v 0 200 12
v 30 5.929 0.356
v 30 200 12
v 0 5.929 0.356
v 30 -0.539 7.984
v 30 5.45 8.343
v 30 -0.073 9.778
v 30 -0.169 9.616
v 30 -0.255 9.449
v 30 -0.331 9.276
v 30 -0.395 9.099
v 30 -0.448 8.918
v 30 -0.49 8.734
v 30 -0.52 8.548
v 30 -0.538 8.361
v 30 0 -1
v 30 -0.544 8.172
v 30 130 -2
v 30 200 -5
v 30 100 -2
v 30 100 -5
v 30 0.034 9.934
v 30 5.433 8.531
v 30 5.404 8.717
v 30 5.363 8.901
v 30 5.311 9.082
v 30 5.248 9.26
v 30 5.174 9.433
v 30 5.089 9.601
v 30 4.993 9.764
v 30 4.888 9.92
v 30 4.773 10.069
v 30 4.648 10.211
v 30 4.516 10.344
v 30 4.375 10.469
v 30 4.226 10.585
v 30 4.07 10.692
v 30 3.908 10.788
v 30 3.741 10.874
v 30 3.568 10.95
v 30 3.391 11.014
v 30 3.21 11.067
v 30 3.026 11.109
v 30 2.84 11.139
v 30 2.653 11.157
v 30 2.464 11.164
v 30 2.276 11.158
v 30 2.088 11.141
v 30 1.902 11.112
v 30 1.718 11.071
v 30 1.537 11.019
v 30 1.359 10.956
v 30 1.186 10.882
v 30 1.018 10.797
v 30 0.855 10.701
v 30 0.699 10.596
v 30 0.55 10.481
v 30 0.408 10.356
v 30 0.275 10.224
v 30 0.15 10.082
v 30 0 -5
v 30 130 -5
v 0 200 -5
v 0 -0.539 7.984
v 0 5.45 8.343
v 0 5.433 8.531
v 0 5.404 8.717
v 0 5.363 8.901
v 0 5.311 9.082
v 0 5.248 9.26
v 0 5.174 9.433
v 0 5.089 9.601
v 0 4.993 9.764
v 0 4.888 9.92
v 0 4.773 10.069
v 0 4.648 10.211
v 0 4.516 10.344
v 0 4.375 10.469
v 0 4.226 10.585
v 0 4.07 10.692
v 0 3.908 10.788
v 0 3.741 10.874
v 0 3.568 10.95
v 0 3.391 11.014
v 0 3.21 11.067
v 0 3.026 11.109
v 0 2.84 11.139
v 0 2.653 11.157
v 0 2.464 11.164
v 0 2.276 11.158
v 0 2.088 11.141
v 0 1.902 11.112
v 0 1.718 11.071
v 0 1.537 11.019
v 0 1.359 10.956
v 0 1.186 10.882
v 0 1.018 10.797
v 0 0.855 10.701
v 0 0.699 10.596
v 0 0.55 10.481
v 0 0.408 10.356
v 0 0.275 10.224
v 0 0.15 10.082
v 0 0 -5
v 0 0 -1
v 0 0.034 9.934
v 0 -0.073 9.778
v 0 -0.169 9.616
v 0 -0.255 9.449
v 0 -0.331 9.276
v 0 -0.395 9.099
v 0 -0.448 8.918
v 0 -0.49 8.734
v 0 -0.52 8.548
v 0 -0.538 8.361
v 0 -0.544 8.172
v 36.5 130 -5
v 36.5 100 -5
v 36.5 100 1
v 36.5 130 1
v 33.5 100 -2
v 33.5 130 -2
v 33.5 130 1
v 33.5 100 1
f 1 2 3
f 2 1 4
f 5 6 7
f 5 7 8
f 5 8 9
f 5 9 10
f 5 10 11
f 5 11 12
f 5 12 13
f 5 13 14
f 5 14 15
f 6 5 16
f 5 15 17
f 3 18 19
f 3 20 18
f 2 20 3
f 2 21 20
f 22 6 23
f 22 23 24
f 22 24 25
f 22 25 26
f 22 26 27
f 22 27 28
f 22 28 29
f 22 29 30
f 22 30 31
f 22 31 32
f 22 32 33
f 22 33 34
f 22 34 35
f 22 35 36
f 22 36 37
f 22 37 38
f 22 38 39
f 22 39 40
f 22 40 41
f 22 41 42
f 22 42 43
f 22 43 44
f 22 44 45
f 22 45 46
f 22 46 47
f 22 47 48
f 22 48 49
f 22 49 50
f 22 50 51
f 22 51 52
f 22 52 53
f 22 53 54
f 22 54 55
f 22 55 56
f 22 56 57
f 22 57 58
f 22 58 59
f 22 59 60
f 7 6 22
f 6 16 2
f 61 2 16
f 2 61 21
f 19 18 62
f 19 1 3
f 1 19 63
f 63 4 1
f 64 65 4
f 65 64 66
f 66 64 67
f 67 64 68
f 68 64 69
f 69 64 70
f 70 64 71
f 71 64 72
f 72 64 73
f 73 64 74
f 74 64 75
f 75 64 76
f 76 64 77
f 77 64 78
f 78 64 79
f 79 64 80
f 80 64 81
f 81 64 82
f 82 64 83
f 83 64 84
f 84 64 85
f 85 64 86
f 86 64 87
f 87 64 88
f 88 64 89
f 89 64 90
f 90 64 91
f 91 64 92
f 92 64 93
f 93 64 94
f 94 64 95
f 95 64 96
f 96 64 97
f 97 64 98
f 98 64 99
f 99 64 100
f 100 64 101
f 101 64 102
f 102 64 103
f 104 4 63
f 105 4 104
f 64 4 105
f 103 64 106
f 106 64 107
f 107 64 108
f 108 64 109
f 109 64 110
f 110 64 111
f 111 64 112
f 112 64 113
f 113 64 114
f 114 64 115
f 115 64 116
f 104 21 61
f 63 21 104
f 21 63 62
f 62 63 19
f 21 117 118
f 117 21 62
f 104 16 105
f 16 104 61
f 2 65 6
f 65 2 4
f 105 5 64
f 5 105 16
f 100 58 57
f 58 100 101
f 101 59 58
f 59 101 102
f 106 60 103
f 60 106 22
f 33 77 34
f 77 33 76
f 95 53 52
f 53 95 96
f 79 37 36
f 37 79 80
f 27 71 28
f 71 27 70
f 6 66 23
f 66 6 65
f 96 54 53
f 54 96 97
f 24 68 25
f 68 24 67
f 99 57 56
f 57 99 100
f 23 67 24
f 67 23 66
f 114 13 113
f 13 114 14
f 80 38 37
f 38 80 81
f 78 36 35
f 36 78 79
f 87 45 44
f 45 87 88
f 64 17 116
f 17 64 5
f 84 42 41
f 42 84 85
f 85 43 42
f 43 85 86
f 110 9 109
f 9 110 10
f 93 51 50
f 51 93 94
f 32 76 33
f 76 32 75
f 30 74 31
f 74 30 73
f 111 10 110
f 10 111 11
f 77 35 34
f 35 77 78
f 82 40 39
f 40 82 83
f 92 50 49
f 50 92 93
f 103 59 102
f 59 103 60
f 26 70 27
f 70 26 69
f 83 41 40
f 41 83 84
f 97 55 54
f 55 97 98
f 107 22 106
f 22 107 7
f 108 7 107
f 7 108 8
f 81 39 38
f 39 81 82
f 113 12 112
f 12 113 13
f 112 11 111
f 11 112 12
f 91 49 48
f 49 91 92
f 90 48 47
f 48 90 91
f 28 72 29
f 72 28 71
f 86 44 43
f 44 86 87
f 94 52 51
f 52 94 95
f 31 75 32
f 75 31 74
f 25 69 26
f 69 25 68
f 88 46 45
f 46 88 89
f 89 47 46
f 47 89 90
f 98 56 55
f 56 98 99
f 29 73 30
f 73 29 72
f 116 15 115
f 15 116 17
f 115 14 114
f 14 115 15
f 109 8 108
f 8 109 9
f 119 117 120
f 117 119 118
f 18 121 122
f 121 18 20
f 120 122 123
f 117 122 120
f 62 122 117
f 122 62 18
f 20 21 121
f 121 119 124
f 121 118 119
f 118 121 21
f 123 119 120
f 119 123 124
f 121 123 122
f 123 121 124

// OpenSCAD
//################# left stand with brace connector #######################
//#########################################################################

// picture a triangle ABC with 𝛾 = 90˚ and the hypothenuse c, then a will correspond to height(h) and b to length(l). A prism in the form of this triangle and width w of the ramp:
module prism(w, l, h){
  polyhedron(
    points=[[0,0,0], [w,0,0], [w,l,0], [0,l,0], [0,l,h], [w,l,h]],
    faces=[[0,1,2,3],[5,4,3,2],[0,4,5,1],[0,3,4],[5,2,1]]
  );
}

module fuss() {
  union(){
    prism(30,200,12);
    translate([0,0,-5]) cube([30,200,5],false);
  }
}

module wall(){
  $fn=100;
  union(){
    cube([30,6,9], center=false);
    translate([0,3,9]) rotate([0,90,0]) cylinder(h=30, r=3, center=false);
  }
}

module connector(){
  union(){
    translate([30,100,-5]) cube([6.5,30,3],false);
    translate([33.5,100,-2]) cube([3,30,3],false);
  }
}

//usage of modules to create part
a=atan(12/200);
union(){
  fuss();
  translate([0,0,-1]) rotate([a,0,0]){
    wall();
  }
  connector();
}
